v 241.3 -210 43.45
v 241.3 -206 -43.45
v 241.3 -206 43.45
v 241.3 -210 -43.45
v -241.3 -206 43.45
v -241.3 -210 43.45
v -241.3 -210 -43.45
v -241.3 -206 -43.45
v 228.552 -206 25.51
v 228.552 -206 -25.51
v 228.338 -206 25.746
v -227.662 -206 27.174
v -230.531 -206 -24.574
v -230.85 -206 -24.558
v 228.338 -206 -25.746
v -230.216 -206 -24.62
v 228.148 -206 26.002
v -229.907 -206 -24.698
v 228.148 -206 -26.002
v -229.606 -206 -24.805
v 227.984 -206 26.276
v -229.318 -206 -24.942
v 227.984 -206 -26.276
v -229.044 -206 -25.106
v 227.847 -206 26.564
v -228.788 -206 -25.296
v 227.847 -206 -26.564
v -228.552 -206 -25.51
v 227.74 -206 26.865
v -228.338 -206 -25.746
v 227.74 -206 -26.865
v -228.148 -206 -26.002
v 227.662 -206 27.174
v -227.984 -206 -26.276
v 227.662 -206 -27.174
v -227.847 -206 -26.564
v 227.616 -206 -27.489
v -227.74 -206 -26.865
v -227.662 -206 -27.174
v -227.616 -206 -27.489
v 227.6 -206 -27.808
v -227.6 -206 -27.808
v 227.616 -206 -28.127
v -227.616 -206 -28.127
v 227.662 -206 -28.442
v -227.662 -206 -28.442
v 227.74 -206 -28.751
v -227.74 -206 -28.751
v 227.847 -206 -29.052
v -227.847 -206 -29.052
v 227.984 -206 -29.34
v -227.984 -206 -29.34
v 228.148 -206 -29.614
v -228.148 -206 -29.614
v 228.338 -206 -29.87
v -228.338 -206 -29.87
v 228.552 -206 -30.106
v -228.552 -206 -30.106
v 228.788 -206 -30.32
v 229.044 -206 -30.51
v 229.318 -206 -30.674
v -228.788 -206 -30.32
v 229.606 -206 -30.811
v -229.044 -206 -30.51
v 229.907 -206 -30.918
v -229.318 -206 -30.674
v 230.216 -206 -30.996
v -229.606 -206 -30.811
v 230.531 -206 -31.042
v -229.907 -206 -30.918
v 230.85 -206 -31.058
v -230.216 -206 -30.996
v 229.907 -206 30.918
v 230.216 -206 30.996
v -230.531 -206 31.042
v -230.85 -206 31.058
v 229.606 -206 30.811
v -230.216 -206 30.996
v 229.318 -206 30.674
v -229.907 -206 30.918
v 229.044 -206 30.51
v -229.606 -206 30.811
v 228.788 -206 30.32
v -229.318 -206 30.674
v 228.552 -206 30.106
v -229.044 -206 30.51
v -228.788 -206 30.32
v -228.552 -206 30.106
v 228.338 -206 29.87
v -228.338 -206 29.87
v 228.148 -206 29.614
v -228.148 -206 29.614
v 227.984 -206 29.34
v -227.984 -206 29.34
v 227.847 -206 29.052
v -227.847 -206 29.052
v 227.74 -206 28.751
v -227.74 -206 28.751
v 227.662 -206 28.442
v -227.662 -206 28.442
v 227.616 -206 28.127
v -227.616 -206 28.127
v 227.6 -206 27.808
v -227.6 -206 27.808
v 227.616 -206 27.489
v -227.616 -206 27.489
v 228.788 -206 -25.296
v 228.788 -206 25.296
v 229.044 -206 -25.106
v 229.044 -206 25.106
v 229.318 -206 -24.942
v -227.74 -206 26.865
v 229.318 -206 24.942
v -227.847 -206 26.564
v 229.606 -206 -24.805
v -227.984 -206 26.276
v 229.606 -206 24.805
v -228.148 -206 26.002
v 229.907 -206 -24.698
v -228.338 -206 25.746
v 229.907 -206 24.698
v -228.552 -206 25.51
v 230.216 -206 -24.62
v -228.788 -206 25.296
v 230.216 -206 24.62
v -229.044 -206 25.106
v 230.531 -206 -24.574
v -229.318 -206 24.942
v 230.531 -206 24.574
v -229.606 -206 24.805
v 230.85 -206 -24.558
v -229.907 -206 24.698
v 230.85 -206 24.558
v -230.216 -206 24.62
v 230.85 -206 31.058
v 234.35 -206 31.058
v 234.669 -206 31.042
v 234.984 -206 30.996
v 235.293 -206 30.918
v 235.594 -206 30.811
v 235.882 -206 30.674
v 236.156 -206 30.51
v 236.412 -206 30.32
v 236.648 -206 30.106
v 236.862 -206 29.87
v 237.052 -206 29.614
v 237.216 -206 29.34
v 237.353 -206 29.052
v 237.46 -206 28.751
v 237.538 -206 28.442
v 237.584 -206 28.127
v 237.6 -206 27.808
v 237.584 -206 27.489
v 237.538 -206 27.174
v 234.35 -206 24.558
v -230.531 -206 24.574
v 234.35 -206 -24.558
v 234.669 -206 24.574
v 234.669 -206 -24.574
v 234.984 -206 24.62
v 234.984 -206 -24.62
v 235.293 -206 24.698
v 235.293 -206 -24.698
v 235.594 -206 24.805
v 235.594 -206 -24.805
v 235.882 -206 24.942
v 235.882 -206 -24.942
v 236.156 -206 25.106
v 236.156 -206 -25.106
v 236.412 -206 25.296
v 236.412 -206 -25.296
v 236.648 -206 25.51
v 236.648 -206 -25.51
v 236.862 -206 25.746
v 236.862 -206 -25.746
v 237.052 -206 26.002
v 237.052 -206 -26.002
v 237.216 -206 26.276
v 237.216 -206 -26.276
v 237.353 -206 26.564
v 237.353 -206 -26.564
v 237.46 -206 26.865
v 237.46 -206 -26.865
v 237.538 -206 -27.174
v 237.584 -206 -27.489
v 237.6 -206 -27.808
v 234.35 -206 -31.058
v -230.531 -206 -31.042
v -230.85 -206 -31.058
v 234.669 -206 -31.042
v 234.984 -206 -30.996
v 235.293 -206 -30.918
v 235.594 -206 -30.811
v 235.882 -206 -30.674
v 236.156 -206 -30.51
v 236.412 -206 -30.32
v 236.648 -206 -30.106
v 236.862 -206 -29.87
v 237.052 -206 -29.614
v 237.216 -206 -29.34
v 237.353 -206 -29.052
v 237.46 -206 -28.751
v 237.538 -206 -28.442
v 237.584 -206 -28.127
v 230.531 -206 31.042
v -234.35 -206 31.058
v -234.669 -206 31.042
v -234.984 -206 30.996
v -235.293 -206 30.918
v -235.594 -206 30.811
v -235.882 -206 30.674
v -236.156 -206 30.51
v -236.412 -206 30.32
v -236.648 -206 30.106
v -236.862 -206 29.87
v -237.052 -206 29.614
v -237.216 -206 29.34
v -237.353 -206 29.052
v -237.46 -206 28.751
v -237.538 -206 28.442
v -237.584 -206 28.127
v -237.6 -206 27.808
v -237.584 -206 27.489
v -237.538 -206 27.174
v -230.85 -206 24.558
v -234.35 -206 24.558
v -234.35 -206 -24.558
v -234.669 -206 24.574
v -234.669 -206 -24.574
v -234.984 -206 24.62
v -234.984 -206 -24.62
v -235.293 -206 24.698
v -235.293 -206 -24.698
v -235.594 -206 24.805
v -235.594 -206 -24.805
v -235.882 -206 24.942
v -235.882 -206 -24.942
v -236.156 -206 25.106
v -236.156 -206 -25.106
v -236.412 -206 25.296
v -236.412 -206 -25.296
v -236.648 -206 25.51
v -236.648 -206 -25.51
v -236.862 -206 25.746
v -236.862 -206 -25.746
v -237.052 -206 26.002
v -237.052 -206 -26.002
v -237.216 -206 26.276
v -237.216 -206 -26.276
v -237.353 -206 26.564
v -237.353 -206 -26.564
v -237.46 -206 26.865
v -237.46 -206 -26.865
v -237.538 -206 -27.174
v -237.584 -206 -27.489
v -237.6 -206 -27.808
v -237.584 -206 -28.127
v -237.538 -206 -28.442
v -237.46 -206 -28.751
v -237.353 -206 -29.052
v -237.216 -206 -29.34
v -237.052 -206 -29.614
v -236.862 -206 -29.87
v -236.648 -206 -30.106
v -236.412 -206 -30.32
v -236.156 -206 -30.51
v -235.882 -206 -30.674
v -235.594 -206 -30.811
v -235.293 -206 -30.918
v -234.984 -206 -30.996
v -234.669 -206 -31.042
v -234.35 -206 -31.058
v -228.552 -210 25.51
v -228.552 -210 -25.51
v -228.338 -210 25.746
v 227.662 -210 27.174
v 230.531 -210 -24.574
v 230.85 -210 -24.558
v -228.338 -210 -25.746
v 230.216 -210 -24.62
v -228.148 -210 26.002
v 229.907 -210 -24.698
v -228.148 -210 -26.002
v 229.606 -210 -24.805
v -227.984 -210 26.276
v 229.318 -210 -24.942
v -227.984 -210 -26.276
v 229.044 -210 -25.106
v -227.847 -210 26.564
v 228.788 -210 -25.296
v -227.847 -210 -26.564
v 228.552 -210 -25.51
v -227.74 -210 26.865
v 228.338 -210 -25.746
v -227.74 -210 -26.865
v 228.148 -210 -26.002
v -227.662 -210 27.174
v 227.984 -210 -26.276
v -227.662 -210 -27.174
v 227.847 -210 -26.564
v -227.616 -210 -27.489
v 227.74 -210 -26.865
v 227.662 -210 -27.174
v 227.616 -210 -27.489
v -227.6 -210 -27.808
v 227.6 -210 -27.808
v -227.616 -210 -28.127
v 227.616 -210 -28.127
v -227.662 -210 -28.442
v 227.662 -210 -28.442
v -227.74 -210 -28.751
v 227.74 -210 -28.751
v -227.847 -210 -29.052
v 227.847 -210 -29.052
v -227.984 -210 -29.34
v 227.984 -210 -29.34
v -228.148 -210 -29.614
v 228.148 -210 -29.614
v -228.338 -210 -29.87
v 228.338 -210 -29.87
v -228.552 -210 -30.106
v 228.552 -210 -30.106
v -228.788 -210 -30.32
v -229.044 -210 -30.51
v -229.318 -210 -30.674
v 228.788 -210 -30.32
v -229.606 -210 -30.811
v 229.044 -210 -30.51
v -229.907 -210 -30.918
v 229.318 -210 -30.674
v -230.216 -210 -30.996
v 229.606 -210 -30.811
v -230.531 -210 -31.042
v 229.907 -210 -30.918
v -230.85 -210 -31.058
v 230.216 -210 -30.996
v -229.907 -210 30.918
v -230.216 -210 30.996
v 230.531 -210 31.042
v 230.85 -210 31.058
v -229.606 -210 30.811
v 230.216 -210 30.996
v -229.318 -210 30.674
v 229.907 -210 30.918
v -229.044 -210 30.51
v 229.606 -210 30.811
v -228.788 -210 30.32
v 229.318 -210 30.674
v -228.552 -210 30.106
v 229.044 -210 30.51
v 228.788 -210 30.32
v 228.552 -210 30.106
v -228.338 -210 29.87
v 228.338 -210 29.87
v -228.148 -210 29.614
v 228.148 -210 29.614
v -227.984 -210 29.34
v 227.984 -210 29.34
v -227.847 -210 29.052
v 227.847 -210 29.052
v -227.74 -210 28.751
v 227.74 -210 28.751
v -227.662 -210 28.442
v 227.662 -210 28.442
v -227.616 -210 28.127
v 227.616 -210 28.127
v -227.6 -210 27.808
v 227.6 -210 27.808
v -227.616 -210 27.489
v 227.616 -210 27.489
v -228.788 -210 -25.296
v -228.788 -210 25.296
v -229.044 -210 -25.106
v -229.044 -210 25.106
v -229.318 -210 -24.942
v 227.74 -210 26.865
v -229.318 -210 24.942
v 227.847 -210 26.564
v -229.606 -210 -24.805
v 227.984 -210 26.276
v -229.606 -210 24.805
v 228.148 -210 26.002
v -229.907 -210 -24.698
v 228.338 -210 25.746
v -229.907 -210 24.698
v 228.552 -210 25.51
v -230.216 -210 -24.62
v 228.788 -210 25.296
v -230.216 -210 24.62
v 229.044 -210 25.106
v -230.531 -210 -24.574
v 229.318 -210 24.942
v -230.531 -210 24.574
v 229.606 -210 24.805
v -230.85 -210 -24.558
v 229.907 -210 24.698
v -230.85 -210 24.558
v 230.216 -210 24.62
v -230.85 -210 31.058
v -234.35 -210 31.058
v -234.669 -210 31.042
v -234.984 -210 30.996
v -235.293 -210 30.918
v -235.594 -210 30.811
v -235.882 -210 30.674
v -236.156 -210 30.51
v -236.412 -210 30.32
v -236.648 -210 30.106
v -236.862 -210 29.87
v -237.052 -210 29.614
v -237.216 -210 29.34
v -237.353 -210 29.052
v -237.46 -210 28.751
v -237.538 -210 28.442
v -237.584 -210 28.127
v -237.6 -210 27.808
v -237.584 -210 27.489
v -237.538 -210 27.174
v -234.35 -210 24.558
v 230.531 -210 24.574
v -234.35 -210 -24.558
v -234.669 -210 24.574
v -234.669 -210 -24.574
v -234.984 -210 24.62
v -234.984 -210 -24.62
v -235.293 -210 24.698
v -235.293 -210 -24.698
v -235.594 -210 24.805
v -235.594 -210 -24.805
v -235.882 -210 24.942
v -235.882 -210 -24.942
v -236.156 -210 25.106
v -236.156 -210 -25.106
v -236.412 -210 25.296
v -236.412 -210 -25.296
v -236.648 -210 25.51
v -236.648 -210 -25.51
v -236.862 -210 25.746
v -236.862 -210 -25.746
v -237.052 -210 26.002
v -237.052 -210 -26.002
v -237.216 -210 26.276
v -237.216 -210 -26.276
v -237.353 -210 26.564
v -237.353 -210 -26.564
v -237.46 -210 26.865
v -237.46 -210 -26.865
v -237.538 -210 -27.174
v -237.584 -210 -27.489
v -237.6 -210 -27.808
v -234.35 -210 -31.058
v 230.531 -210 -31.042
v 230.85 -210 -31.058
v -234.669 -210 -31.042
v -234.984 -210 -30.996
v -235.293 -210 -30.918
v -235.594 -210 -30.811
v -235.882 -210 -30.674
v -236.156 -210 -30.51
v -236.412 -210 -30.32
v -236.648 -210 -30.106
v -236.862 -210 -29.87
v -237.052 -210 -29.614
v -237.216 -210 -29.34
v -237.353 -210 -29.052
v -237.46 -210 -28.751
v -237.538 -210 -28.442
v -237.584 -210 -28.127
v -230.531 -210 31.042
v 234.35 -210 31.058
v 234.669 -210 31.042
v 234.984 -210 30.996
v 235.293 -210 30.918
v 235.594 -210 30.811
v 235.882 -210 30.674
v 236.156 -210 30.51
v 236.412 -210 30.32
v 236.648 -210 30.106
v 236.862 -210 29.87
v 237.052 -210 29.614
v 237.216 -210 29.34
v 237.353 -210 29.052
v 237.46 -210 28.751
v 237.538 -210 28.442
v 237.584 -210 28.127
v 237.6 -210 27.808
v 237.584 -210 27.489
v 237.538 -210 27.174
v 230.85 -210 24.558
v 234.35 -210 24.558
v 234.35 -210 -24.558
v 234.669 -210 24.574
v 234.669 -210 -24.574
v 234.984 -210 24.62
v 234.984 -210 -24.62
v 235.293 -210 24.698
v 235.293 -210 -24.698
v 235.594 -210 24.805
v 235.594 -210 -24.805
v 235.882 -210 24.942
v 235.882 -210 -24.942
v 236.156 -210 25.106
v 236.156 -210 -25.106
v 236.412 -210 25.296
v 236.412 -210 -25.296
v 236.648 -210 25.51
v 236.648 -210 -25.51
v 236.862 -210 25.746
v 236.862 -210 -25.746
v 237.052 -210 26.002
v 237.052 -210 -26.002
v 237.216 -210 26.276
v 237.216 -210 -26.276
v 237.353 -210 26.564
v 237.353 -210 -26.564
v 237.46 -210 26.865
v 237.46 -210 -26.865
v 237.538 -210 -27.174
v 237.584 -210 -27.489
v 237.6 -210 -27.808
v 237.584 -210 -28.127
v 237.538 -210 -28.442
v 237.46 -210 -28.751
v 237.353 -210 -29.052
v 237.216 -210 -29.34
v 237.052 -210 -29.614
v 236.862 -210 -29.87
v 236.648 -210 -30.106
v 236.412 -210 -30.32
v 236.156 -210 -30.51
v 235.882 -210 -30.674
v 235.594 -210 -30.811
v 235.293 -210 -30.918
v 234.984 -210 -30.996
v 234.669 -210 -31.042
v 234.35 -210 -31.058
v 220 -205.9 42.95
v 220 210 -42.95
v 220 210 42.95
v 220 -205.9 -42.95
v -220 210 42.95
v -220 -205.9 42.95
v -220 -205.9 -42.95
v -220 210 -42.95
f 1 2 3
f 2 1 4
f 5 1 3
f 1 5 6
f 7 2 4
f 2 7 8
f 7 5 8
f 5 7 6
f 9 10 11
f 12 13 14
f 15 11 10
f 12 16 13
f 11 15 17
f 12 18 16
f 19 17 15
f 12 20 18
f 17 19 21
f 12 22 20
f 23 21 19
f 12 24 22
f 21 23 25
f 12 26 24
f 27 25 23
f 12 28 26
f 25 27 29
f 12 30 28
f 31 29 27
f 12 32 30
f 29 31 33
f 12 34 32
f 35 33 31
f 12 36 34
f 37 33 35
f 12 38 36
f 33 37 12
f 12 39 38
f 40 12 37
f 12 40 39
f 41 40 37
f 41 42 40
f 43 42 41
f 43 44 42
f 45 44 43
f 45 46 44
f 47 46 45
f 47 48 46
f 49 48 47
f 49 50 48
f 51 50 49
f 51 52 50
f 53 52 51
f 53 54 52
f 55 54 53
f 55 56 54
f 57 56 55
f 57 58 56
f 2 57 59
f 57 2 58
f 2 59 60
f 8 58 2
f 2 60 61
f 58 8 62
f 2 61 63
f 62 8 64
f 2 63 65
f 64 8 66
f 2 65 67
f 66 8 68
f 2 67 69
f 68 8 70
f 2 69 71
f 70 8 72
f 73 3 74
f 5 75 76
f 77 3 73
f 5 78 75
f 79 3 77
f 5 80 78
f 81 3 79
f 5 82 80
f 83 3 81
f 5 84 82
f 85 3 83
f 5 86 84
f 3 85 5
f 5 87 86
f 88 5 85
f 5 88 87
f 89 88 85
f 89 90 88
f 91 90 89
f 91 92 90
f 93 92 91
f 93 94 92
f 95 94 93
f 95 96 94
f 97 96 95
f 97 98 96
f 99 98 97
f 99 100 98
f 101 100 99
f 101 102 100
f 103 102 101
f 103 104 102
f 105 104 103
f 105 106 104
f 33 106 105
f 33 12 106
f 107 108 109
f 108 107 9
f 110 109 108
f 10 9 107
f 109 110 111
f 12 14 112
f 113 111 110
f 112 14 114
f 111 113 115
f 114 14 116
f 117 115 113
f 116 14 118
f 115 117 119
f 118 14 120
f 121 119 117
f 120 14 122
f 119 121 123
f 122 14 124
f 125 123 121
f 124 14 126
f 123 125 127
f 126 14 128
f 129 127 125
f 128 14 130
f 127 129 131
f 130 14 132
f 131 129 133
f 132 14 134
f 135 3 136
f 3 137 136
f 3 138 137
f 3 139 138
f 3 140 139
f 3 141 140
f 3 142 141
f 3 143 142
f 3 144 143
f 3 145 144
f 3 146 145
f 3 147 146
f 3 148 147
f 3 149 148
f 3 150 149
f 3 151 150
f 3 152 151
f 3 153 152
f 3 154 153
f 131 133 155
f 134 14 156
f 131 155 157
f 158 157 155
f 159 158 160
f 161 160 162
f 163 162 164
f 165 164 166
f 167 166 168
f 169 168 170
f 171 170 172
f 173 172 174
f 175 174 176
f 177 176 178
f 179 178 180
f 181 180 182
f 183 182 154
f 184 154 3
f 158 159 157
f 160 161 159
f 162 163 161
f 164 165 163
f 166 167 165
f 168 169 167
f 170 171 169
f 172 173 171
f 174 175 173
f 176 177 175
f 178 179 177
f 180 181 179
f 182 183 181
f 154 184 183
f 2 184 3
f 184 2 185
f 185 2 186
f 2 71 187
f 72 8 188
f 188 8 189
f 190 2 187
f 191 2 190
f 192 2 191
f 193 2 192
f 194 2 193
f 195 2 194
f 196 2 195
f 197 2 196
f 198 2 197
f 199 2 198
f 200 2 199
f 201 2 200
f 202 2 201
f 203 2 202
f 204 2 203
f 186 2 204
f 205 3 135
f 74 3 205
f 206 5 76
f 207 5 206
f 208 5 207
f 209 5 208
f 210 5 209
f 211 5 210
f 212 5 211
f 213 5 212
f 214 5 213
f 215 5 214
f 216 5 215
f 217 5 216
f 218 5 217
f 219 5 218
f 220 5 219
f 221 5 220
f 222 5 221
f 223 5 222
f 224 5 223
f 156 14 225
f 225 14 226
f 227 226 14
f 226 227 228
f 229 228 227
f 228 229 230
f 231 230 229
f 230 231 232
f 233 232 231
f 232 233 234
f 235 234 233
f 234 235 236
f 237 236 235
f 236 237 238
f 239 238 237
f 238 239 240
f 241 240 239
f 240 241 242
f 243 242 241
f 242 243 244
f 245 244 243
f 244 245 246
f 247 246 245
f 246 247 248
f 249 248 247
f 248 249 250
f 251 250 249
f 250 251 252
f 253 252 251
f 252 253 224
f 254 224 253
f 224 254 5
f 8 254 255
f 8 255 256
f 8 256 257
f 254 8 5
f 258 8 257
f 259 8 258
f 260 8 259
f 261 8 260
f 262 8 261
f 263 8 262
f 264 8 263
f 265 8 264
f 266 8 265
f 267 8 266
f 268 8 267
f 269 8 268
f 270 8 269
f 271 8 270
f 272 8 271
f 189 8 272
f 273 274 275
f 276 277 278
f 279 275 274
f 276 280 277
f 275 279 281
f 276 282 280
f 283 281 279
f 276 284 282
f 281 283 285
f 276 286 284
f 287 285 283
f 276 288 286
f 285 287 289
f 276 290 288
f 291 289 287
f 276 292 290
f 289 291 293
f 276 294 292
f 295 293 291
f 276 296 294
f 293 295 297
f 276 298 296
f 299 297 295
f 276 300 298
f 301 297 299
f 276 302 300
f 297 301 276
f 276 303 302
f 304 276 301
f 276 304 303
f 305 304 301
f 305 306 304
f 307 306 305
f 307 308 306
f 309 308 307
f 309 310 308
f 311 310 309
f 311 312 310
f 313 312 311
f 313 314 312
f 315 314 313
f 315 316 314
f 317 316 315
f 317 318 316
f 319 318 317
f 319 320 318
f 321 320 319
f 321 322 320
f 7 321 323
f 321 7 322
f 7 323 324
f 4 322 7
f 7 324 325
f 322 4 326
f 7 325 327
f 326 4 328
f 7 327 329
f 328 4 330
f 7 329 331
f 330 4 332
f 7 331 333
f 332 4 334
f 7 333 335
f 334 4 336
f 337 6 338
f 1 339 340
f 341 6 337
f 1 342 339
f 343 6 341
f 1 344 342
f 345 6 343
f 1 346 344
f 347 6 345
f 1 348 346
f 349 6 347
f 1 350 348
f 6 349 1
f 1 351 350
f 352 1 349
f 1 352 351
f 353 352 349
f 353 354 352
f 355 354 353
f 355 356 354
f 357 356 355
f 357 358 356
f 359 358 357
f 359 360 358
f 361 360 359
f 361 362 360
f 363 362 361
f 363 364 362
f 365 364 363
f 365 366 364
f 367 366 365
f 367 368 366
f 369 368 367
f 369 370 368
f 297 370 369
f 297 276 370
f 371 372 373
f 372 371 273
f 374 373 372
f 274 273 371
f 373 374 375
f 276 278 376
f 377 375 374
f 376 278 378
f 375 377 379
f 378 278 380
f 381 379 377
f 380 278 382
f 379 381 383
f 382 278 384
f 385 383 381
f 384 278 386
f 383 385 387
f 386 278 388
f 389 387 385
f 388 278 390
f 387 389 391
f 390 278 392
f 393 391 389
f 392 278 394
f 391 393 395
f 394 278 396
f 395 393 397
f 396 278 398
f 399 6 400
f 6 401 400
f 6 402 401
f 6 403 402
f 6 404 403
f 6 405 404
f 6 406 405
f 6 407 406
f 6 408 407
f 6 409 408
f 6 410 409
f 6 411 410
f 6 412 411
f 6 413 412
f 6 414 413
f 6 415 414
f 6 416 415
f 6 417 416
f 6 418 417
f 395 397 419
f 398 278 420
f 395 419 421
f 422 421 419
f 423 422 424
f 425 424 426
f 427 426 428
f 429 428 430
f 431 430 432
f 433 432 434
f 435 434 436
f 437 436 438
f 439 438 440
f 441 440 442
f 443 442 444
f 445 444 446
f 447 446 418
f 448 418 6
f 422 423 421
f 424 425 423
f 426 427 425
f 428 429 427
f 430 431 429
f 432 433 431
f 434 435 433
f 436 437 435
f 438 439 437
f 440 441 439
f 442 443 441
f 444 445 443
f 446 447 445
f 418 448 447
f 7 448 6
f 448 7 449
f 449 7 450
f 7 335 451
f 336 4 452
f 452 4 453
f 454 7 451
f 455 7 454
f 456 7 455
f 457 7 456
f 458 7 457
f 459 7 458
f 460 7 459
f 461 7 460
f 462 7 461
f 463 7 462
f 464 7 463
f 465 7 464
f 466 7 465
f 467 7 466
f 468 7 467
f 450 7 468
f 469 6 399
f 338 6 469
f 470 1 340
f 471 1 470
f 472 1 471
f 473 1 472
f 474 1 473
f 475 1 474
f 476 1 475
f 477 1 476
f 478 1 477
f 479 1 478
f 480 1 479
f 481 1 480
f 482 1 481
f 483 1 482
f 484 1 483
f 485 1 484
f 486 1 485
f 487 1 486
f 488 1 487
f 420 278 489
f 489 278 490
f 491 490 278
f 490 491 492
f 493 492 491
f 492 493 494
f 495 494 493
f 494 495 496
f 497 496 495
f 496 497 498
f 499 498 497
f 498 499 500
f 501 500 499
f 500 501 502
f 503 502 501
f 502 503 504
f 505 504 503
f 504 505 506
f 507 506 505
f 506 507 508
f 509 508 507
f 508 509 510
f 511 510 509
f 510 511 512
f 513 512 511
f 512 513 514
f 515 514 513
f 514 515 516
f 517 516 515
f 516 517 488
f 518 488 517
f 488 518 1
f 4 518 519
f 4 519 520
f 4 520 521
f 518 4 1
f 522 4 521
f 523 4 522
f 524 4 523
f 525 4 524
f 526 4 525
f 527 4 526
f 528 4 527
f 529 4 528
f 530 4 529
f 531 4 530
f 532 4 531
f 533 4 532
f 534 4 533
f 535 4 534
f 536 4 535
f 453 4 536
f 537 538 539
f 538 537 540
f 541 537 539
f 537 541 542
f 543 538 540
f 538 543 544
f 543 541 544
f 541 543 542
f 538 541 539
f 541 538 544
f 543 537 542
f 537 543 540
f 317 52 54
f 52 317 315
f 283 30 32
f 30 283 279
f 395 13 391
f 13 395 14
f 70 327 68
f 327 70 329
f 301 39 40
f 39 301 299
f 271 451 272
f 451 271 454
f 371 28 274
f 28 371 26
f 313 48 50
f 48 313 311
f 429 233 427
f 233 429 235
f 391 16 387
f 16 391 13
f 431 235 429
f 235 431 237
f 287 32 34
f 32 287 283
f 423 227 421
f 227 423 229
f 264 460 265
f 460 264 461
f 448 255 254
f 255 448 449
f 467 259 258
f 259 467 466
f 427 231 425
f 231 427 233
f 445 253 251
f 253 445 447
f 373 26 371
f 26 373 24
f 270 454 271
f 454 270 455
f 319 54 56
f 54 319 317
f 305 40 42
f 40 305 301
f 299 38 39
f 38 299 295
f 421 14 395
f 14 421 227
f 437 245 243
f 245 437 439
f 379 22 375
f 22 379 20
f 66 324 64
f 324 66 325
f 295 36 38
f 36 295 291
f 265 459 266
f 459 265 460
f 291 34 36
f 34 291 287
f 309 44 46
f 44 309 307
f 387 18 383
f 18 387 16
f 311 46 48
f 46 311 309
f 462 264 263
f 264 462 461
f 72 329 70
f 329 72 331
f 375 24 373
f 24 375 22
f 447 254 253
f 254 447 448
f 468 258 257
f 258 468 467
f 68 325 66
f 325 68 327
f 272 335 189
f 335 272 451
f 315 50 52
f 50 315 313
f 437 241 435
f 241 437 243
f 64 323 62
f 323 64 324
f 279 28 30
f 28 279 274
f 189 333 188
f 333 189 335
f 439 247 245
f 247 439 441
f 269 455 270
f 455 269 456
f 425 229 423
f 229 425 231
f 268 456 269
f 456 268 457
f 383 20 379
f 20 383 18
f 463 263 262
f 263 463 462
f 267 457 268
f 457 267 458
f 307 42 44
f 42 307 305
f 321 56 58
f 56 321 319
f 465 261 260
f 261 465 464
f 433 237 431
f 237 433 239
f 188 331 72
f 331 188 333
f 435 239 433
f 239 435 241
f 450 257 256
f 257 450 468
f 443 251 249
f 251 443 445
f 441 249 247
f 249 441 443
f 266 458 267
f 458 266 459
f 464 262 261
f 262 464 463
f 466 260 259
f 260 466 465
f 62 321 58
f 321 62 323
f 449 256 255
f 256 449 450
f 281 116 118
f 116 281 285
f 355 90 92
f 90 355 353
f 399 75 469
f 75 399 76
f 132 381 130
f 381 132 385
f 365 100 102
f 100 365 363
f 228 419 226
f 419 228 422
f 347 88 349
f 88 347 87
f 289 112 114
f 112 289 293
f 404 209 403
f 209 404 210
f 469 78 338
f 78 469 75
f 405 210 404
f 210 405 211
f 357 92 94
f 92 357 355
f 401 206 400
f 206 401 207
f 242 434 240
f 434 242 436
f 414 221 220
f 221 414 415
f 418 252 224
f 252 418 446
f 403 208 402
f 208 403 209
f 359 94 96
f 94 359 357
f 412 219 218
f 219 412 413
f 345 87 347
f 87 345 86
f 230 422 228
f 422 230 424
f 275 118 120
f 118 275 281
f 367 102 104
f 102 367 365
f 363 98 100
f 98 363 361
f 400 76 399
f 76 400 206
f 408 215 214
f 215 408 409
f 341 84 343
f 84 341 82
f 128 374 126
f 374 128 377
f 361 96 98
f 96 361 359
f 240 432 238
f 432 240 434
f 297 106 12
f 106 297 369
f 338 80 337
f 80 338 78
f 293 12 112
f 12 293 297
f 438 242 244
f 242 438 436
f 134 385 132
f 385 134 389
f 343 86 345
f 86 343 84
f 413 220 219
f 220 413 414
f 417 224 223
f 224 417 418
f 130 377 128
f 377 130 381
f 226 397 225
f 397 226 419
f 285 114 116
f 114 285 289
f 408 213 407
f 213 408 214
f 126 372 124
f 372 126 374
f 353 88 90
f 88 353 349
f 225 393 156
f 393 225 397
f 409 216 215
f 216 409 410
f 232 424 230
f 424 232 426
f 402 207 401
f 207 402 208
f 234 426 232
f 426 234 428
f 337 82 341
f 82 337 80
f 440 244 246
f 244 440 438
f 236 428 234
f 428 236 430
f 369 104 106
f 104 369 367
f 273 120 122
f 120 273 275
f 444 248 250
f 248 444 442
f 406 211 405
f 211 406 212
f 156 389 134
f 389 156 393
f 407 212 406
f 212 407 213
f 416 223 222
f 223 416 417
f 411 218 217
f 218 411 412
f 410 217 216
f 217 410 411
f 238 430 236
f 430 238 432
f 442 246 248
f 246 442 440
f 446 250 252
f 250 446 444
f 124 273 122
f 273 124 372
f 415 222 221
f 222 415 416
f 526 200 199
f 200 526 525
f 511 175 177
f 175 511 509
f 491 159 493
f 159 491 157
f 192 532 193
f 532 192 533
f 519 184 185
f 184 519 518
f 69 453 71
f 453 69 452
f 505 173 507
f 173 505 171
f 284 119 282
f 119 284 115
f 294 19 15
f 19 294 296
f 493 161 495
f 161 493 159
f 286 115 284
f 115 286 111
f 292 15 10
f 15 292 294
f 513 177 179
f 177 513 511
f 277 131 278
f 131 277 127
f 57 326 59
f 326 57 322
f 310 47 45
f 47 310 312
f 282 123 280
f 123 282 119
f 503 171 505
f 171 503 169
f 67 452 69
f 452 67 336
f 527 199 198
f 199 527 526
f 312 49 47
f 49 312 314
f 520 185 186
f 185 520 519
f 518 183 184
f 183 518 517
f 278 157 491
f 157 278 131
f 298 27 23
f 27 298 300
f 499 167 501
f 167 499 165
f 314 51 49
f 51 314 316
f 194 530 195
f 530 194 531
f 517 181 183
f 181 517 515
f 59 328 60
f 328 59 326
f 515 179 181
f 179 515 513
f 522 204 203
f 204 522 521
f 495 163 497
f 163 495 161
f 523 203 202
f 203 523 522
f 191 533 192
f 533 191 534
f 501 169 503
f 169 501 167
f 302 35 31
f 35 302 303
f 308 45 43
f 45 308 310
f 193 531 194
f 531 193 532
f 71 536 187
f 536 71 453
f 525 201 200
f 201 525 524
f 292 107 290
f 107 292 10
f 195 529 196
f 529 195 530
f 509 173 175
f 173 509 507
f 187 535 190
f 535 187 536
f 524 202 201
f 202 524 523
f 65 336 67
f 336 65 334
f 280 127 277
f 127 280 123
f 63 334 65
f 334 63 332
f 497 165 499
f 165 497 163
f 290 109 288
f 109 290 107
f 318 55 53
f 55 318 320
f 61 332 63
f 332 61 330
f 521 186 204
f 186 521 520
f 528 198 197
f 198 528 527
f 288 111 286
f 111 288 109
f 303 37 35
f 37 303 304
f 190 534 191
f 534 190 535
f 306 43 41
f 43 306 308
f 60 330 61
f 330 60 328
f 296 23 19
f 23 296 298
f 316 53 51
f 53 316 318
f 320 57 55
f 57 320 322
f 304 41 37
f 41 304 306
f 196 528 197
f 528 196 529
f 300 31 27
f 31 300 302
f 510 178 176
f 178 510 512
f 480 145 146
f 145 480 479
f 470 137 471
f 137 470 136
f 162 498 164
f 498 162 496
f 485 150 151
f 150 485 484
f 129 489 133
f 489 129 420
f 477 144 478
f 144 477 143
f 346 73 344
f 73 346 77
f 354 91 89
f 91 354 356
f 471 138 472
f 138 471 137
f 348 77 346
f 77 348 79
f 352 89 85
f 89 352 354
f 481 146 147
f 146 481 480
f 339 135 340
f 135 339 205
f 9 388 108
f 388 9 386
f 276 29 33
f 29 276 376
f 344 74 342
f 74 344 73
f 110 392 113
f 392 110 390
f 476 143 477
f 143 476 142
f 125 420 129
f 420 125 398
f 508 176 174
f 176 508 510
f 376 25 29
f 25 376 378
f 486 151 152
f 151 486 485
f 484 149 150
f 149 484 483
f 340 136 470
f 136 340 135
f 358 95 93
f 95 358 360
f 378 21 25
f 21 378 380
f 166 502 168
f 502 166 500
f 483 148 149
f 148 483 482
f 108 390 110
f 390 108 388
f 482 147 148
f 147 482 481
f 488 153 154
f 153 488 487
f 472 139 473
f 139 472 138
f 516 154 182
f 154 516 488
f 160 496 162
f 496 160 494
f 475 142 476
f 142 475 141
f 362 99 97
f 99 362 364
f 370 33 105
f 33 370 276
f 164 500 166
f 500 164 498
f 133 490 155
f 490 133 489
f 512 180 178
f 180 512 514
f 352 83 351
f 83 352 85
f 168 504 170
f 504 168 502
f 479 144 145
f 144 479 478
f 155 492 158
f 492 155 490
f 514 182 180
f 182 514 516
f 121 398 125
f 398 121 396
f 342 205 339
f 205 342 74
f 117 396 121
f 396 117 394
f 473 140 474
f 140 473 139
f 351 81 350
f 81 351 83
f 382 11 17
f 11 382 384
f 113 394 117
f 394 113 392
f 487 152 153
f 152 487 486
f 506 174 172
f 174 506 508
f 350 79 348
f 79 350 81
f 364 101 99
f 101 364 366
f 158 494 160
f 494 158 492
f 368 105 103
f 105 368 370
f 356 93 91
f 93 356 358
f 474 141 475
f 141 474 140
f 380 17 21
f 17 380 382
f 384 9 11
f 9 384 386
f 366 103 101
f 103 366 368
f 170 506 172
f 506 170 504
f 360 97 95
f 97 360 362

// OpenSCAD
// ============================================================================
// Atom Lithography Machine — Parametric OpenSCAD Module (S6.5-01)
// ============================================================================
// part_id           : S6.5-01
// parent_bom_id     : S6.5
// subsystem         : S6
// part_name         : RF/ENDOR cekirdek adresleme DDS sinyal kaynaklari (1-200 MHz)
// material          : Al 6061
// temp_stage        : 300 K (kabin)
// vacuum_grade      : Atmosfer
// tolerance         : ±0.1 Hz
// computed_mass_kg  : 8.44085
// envelope_mm       : 482.600 x 432.050 x 86.900
// design_maturity   : M0_M1_DETAILED_CAD_DESIGN_ONLY
// no_lab_measurement: true
// iec61508_certified: false
// semi_s2_certified : false
// Units: millimeters (mm)
// ============================================================================

$fn = 64;

// Nominal bounding envelope parameters (mm)
bbox_x = 482.6000;
bbox_y = 432.0500;
bbox_z = 86.9000;

// Part-specific parametric dimensions
rack_u = 2;
qty_units = 4;
f_max_mhz = 200.0;

// Interface / port parameters (mm)

module part_S6_5_01() {
  difference() {
    union() {
      // 19" EIA-310 front bezel panel
      translate([0.000, -208.000, 0.000]) cube([482.600, 4.000, 86.900], center=true);
      // Hollow EMI shielded chassis body
      translate([0.000, 2.050, 0.000]) cube([440.000, 415.900, 85.900], center=true);
    }
    // EIA-310 rack ear slot
    translate([-232.600, -208.000, -27.808]) rotate([90.000, 0.000, 0.000]) {
      hull() {
        translate([-1.750, 0, 0]) cylinder(d=6.500, h=6.000, center=true);
        translate([1.750, 0, 0]) cylinder(d=6.500, h=6.000, center=true);
      }
    }
    // EIA-310 rack ear slot
    translate([-232.600, -208.000, 27.808]) rotate([90.000, 0.000, 0.000]) {
      hull() {
        translate([-1.750, 0, 0]) cylinder(d=6.500, h=6.000, center=true);
        translate([1.750, 0, 0]) cylinder(d=6.500, h=6.000, center=true);
      }
    }
    // EIA-310 rack ear slot
    translate([232.600, -208.000, -27.808]) rotate([90.000, 0.000, 0.000]) {
      hull() {
        translate([-1.750, 0, 0]) cylinder(d=6.500, h=6.000, center=true);
        translate([1.750, 0, 0]) cylinder(d=6.500, h=6.000, center=true);
      }
    }
    // EIA-310 rack ear slot
    translate([232.600, -208.000, 27.808]) rotate([90.000, 0.000, 0.000]) {
      hull() {
        translate([-1.750, 0, 0]) cylinder(d=6.500, h=6.000, center=true);
        translate([1.750, 0, 0]) cylinder(d=6.500, h=6.000, center=true);
      }
    }
  }
}

// World assembly mounting transform (global machine frame, mm / deg):
// translate([2100.000, 0.000, 490.050]) rotate([0.000, 0.000, 0.000]) part_S6_5_01();

part_S6_5_01();
